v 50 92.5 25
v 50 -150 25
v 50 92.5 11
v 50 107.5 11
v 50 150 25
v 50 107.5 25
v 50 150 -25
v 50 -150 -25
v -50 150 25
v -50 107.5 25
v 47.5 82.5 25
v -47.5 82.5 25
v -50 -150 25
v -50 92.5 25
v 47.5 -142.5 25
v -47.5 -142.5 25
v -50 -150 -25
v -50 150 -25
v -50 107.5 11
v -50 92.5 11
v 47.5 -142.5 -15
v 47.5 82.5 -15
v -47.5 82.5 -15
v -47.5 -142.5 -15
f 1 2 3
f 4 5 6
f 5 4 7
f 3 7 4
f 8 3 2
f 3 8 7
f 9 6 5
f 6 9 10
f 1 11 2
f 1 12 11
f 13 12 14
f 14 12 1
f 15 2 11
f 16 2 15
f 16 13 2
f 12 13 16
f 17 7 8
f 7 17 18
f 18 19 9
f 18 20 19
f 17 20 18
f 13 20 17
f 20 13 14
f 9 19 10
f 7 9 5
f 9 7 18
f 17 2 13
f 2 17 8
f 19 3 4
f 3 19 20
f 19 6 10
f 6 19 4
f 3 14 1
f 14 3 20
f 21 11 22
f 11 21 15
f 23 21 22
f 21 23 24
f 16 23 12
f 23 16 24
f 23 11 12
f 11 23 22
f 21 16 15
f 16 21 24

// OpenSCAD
holder_width = 100; // [1:500]

holder_height = 300; // [1:500]

holder_depth = 50; // [1:200]

tablet_thickness = 15; // [1:40]

frame_height = 15; // [0:40]

//tablet_width = 205; // [0:500]


difference(){

	cube([holder_width,holder_height,holder_depth],center = true);
	translate([0, holder_height/3, (holder_depth/2)-frame_height+1])
	linear_extrude(height=frame_height)
	square([holder_width+10,tablet_thickness],center=true);
	
	translate([0,-holder_height/10,holder_depth/5])
	cube([holder_width-5,holder_height*3/4,holder_depth],center = true);
	//translate([(holder_height/8), -(tablet_width/5), (holder_depth/2)-frame_height+1])
	//linear_extrude(height=frame_height)
	//rotate(90) square([tablet_width+10,tablet_thickness],center=true);

	//translate([holder_width/2-3, -(tablet_width/5), 20])
	//	cube([8,tablet_width,frame_height],center = true);
}
